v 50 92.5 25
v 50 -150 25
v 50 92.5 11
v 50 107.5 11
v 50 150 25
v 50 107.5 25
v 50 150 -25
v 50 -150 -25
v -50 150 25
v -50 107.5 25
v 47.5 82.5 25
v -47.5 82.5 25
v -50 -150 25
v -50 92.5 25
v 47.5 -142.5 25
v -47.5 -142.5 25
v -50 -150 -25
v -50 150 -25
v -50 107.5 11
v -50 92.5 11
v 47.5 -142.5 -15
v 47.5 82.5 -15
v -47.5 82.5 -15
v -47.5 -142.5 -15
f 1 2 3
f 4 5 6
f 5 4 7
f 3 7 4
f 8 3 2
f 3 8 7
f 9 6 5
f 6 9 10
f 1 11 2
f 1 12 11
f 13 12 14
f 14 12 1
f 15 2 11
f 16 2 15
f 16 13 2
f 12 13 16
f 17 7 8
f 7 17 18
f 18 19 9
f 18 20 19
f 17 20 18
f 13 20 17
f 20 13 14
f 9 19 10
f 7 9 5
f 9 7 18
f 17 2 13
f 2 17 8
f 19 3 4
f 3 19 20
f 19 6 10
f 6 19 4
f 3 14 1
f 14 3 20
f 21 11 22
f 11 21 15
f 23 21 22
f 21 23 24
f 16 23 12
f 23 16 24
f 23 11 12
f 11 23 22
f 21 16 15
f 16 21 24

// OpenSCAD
holder_width = 100; // [1:500]

holder_height = 300; // [1:500]

holder_depth = 50; // [1:200]

tablet_thickness = 15; // [1:40]

frame_height = 15; // [0:40]

//tablet_width = 205; // [0:500]


difference(){

	cube([holder_width,holder_height,holder_depth],center = true);
	translate([0, holder_height/3, (holder_depth/2)-frame_height+1])
	linear_extrude(height=frame_height)
	square([holder_width+10,tablet_thickness],center=true);
	
	translate([0,-holder_height/10,holder_depth/5])
	cube([holder_width-5,holder_height*3/4,holder_depth],center = true);
	//translate([(holder_height/8), -(tablet_width/5), (holder_depth/2)-frame_height+1])
	//linear_extrude(height=frame_height)
	//rotate(90) square([tablet_width+10,tablet_thickness],center=true);

	//translate([holder_width/2-3, -(tablet_width/5), 20])
	//	cube([8,tablet_width,frame_height],center = true);
}
